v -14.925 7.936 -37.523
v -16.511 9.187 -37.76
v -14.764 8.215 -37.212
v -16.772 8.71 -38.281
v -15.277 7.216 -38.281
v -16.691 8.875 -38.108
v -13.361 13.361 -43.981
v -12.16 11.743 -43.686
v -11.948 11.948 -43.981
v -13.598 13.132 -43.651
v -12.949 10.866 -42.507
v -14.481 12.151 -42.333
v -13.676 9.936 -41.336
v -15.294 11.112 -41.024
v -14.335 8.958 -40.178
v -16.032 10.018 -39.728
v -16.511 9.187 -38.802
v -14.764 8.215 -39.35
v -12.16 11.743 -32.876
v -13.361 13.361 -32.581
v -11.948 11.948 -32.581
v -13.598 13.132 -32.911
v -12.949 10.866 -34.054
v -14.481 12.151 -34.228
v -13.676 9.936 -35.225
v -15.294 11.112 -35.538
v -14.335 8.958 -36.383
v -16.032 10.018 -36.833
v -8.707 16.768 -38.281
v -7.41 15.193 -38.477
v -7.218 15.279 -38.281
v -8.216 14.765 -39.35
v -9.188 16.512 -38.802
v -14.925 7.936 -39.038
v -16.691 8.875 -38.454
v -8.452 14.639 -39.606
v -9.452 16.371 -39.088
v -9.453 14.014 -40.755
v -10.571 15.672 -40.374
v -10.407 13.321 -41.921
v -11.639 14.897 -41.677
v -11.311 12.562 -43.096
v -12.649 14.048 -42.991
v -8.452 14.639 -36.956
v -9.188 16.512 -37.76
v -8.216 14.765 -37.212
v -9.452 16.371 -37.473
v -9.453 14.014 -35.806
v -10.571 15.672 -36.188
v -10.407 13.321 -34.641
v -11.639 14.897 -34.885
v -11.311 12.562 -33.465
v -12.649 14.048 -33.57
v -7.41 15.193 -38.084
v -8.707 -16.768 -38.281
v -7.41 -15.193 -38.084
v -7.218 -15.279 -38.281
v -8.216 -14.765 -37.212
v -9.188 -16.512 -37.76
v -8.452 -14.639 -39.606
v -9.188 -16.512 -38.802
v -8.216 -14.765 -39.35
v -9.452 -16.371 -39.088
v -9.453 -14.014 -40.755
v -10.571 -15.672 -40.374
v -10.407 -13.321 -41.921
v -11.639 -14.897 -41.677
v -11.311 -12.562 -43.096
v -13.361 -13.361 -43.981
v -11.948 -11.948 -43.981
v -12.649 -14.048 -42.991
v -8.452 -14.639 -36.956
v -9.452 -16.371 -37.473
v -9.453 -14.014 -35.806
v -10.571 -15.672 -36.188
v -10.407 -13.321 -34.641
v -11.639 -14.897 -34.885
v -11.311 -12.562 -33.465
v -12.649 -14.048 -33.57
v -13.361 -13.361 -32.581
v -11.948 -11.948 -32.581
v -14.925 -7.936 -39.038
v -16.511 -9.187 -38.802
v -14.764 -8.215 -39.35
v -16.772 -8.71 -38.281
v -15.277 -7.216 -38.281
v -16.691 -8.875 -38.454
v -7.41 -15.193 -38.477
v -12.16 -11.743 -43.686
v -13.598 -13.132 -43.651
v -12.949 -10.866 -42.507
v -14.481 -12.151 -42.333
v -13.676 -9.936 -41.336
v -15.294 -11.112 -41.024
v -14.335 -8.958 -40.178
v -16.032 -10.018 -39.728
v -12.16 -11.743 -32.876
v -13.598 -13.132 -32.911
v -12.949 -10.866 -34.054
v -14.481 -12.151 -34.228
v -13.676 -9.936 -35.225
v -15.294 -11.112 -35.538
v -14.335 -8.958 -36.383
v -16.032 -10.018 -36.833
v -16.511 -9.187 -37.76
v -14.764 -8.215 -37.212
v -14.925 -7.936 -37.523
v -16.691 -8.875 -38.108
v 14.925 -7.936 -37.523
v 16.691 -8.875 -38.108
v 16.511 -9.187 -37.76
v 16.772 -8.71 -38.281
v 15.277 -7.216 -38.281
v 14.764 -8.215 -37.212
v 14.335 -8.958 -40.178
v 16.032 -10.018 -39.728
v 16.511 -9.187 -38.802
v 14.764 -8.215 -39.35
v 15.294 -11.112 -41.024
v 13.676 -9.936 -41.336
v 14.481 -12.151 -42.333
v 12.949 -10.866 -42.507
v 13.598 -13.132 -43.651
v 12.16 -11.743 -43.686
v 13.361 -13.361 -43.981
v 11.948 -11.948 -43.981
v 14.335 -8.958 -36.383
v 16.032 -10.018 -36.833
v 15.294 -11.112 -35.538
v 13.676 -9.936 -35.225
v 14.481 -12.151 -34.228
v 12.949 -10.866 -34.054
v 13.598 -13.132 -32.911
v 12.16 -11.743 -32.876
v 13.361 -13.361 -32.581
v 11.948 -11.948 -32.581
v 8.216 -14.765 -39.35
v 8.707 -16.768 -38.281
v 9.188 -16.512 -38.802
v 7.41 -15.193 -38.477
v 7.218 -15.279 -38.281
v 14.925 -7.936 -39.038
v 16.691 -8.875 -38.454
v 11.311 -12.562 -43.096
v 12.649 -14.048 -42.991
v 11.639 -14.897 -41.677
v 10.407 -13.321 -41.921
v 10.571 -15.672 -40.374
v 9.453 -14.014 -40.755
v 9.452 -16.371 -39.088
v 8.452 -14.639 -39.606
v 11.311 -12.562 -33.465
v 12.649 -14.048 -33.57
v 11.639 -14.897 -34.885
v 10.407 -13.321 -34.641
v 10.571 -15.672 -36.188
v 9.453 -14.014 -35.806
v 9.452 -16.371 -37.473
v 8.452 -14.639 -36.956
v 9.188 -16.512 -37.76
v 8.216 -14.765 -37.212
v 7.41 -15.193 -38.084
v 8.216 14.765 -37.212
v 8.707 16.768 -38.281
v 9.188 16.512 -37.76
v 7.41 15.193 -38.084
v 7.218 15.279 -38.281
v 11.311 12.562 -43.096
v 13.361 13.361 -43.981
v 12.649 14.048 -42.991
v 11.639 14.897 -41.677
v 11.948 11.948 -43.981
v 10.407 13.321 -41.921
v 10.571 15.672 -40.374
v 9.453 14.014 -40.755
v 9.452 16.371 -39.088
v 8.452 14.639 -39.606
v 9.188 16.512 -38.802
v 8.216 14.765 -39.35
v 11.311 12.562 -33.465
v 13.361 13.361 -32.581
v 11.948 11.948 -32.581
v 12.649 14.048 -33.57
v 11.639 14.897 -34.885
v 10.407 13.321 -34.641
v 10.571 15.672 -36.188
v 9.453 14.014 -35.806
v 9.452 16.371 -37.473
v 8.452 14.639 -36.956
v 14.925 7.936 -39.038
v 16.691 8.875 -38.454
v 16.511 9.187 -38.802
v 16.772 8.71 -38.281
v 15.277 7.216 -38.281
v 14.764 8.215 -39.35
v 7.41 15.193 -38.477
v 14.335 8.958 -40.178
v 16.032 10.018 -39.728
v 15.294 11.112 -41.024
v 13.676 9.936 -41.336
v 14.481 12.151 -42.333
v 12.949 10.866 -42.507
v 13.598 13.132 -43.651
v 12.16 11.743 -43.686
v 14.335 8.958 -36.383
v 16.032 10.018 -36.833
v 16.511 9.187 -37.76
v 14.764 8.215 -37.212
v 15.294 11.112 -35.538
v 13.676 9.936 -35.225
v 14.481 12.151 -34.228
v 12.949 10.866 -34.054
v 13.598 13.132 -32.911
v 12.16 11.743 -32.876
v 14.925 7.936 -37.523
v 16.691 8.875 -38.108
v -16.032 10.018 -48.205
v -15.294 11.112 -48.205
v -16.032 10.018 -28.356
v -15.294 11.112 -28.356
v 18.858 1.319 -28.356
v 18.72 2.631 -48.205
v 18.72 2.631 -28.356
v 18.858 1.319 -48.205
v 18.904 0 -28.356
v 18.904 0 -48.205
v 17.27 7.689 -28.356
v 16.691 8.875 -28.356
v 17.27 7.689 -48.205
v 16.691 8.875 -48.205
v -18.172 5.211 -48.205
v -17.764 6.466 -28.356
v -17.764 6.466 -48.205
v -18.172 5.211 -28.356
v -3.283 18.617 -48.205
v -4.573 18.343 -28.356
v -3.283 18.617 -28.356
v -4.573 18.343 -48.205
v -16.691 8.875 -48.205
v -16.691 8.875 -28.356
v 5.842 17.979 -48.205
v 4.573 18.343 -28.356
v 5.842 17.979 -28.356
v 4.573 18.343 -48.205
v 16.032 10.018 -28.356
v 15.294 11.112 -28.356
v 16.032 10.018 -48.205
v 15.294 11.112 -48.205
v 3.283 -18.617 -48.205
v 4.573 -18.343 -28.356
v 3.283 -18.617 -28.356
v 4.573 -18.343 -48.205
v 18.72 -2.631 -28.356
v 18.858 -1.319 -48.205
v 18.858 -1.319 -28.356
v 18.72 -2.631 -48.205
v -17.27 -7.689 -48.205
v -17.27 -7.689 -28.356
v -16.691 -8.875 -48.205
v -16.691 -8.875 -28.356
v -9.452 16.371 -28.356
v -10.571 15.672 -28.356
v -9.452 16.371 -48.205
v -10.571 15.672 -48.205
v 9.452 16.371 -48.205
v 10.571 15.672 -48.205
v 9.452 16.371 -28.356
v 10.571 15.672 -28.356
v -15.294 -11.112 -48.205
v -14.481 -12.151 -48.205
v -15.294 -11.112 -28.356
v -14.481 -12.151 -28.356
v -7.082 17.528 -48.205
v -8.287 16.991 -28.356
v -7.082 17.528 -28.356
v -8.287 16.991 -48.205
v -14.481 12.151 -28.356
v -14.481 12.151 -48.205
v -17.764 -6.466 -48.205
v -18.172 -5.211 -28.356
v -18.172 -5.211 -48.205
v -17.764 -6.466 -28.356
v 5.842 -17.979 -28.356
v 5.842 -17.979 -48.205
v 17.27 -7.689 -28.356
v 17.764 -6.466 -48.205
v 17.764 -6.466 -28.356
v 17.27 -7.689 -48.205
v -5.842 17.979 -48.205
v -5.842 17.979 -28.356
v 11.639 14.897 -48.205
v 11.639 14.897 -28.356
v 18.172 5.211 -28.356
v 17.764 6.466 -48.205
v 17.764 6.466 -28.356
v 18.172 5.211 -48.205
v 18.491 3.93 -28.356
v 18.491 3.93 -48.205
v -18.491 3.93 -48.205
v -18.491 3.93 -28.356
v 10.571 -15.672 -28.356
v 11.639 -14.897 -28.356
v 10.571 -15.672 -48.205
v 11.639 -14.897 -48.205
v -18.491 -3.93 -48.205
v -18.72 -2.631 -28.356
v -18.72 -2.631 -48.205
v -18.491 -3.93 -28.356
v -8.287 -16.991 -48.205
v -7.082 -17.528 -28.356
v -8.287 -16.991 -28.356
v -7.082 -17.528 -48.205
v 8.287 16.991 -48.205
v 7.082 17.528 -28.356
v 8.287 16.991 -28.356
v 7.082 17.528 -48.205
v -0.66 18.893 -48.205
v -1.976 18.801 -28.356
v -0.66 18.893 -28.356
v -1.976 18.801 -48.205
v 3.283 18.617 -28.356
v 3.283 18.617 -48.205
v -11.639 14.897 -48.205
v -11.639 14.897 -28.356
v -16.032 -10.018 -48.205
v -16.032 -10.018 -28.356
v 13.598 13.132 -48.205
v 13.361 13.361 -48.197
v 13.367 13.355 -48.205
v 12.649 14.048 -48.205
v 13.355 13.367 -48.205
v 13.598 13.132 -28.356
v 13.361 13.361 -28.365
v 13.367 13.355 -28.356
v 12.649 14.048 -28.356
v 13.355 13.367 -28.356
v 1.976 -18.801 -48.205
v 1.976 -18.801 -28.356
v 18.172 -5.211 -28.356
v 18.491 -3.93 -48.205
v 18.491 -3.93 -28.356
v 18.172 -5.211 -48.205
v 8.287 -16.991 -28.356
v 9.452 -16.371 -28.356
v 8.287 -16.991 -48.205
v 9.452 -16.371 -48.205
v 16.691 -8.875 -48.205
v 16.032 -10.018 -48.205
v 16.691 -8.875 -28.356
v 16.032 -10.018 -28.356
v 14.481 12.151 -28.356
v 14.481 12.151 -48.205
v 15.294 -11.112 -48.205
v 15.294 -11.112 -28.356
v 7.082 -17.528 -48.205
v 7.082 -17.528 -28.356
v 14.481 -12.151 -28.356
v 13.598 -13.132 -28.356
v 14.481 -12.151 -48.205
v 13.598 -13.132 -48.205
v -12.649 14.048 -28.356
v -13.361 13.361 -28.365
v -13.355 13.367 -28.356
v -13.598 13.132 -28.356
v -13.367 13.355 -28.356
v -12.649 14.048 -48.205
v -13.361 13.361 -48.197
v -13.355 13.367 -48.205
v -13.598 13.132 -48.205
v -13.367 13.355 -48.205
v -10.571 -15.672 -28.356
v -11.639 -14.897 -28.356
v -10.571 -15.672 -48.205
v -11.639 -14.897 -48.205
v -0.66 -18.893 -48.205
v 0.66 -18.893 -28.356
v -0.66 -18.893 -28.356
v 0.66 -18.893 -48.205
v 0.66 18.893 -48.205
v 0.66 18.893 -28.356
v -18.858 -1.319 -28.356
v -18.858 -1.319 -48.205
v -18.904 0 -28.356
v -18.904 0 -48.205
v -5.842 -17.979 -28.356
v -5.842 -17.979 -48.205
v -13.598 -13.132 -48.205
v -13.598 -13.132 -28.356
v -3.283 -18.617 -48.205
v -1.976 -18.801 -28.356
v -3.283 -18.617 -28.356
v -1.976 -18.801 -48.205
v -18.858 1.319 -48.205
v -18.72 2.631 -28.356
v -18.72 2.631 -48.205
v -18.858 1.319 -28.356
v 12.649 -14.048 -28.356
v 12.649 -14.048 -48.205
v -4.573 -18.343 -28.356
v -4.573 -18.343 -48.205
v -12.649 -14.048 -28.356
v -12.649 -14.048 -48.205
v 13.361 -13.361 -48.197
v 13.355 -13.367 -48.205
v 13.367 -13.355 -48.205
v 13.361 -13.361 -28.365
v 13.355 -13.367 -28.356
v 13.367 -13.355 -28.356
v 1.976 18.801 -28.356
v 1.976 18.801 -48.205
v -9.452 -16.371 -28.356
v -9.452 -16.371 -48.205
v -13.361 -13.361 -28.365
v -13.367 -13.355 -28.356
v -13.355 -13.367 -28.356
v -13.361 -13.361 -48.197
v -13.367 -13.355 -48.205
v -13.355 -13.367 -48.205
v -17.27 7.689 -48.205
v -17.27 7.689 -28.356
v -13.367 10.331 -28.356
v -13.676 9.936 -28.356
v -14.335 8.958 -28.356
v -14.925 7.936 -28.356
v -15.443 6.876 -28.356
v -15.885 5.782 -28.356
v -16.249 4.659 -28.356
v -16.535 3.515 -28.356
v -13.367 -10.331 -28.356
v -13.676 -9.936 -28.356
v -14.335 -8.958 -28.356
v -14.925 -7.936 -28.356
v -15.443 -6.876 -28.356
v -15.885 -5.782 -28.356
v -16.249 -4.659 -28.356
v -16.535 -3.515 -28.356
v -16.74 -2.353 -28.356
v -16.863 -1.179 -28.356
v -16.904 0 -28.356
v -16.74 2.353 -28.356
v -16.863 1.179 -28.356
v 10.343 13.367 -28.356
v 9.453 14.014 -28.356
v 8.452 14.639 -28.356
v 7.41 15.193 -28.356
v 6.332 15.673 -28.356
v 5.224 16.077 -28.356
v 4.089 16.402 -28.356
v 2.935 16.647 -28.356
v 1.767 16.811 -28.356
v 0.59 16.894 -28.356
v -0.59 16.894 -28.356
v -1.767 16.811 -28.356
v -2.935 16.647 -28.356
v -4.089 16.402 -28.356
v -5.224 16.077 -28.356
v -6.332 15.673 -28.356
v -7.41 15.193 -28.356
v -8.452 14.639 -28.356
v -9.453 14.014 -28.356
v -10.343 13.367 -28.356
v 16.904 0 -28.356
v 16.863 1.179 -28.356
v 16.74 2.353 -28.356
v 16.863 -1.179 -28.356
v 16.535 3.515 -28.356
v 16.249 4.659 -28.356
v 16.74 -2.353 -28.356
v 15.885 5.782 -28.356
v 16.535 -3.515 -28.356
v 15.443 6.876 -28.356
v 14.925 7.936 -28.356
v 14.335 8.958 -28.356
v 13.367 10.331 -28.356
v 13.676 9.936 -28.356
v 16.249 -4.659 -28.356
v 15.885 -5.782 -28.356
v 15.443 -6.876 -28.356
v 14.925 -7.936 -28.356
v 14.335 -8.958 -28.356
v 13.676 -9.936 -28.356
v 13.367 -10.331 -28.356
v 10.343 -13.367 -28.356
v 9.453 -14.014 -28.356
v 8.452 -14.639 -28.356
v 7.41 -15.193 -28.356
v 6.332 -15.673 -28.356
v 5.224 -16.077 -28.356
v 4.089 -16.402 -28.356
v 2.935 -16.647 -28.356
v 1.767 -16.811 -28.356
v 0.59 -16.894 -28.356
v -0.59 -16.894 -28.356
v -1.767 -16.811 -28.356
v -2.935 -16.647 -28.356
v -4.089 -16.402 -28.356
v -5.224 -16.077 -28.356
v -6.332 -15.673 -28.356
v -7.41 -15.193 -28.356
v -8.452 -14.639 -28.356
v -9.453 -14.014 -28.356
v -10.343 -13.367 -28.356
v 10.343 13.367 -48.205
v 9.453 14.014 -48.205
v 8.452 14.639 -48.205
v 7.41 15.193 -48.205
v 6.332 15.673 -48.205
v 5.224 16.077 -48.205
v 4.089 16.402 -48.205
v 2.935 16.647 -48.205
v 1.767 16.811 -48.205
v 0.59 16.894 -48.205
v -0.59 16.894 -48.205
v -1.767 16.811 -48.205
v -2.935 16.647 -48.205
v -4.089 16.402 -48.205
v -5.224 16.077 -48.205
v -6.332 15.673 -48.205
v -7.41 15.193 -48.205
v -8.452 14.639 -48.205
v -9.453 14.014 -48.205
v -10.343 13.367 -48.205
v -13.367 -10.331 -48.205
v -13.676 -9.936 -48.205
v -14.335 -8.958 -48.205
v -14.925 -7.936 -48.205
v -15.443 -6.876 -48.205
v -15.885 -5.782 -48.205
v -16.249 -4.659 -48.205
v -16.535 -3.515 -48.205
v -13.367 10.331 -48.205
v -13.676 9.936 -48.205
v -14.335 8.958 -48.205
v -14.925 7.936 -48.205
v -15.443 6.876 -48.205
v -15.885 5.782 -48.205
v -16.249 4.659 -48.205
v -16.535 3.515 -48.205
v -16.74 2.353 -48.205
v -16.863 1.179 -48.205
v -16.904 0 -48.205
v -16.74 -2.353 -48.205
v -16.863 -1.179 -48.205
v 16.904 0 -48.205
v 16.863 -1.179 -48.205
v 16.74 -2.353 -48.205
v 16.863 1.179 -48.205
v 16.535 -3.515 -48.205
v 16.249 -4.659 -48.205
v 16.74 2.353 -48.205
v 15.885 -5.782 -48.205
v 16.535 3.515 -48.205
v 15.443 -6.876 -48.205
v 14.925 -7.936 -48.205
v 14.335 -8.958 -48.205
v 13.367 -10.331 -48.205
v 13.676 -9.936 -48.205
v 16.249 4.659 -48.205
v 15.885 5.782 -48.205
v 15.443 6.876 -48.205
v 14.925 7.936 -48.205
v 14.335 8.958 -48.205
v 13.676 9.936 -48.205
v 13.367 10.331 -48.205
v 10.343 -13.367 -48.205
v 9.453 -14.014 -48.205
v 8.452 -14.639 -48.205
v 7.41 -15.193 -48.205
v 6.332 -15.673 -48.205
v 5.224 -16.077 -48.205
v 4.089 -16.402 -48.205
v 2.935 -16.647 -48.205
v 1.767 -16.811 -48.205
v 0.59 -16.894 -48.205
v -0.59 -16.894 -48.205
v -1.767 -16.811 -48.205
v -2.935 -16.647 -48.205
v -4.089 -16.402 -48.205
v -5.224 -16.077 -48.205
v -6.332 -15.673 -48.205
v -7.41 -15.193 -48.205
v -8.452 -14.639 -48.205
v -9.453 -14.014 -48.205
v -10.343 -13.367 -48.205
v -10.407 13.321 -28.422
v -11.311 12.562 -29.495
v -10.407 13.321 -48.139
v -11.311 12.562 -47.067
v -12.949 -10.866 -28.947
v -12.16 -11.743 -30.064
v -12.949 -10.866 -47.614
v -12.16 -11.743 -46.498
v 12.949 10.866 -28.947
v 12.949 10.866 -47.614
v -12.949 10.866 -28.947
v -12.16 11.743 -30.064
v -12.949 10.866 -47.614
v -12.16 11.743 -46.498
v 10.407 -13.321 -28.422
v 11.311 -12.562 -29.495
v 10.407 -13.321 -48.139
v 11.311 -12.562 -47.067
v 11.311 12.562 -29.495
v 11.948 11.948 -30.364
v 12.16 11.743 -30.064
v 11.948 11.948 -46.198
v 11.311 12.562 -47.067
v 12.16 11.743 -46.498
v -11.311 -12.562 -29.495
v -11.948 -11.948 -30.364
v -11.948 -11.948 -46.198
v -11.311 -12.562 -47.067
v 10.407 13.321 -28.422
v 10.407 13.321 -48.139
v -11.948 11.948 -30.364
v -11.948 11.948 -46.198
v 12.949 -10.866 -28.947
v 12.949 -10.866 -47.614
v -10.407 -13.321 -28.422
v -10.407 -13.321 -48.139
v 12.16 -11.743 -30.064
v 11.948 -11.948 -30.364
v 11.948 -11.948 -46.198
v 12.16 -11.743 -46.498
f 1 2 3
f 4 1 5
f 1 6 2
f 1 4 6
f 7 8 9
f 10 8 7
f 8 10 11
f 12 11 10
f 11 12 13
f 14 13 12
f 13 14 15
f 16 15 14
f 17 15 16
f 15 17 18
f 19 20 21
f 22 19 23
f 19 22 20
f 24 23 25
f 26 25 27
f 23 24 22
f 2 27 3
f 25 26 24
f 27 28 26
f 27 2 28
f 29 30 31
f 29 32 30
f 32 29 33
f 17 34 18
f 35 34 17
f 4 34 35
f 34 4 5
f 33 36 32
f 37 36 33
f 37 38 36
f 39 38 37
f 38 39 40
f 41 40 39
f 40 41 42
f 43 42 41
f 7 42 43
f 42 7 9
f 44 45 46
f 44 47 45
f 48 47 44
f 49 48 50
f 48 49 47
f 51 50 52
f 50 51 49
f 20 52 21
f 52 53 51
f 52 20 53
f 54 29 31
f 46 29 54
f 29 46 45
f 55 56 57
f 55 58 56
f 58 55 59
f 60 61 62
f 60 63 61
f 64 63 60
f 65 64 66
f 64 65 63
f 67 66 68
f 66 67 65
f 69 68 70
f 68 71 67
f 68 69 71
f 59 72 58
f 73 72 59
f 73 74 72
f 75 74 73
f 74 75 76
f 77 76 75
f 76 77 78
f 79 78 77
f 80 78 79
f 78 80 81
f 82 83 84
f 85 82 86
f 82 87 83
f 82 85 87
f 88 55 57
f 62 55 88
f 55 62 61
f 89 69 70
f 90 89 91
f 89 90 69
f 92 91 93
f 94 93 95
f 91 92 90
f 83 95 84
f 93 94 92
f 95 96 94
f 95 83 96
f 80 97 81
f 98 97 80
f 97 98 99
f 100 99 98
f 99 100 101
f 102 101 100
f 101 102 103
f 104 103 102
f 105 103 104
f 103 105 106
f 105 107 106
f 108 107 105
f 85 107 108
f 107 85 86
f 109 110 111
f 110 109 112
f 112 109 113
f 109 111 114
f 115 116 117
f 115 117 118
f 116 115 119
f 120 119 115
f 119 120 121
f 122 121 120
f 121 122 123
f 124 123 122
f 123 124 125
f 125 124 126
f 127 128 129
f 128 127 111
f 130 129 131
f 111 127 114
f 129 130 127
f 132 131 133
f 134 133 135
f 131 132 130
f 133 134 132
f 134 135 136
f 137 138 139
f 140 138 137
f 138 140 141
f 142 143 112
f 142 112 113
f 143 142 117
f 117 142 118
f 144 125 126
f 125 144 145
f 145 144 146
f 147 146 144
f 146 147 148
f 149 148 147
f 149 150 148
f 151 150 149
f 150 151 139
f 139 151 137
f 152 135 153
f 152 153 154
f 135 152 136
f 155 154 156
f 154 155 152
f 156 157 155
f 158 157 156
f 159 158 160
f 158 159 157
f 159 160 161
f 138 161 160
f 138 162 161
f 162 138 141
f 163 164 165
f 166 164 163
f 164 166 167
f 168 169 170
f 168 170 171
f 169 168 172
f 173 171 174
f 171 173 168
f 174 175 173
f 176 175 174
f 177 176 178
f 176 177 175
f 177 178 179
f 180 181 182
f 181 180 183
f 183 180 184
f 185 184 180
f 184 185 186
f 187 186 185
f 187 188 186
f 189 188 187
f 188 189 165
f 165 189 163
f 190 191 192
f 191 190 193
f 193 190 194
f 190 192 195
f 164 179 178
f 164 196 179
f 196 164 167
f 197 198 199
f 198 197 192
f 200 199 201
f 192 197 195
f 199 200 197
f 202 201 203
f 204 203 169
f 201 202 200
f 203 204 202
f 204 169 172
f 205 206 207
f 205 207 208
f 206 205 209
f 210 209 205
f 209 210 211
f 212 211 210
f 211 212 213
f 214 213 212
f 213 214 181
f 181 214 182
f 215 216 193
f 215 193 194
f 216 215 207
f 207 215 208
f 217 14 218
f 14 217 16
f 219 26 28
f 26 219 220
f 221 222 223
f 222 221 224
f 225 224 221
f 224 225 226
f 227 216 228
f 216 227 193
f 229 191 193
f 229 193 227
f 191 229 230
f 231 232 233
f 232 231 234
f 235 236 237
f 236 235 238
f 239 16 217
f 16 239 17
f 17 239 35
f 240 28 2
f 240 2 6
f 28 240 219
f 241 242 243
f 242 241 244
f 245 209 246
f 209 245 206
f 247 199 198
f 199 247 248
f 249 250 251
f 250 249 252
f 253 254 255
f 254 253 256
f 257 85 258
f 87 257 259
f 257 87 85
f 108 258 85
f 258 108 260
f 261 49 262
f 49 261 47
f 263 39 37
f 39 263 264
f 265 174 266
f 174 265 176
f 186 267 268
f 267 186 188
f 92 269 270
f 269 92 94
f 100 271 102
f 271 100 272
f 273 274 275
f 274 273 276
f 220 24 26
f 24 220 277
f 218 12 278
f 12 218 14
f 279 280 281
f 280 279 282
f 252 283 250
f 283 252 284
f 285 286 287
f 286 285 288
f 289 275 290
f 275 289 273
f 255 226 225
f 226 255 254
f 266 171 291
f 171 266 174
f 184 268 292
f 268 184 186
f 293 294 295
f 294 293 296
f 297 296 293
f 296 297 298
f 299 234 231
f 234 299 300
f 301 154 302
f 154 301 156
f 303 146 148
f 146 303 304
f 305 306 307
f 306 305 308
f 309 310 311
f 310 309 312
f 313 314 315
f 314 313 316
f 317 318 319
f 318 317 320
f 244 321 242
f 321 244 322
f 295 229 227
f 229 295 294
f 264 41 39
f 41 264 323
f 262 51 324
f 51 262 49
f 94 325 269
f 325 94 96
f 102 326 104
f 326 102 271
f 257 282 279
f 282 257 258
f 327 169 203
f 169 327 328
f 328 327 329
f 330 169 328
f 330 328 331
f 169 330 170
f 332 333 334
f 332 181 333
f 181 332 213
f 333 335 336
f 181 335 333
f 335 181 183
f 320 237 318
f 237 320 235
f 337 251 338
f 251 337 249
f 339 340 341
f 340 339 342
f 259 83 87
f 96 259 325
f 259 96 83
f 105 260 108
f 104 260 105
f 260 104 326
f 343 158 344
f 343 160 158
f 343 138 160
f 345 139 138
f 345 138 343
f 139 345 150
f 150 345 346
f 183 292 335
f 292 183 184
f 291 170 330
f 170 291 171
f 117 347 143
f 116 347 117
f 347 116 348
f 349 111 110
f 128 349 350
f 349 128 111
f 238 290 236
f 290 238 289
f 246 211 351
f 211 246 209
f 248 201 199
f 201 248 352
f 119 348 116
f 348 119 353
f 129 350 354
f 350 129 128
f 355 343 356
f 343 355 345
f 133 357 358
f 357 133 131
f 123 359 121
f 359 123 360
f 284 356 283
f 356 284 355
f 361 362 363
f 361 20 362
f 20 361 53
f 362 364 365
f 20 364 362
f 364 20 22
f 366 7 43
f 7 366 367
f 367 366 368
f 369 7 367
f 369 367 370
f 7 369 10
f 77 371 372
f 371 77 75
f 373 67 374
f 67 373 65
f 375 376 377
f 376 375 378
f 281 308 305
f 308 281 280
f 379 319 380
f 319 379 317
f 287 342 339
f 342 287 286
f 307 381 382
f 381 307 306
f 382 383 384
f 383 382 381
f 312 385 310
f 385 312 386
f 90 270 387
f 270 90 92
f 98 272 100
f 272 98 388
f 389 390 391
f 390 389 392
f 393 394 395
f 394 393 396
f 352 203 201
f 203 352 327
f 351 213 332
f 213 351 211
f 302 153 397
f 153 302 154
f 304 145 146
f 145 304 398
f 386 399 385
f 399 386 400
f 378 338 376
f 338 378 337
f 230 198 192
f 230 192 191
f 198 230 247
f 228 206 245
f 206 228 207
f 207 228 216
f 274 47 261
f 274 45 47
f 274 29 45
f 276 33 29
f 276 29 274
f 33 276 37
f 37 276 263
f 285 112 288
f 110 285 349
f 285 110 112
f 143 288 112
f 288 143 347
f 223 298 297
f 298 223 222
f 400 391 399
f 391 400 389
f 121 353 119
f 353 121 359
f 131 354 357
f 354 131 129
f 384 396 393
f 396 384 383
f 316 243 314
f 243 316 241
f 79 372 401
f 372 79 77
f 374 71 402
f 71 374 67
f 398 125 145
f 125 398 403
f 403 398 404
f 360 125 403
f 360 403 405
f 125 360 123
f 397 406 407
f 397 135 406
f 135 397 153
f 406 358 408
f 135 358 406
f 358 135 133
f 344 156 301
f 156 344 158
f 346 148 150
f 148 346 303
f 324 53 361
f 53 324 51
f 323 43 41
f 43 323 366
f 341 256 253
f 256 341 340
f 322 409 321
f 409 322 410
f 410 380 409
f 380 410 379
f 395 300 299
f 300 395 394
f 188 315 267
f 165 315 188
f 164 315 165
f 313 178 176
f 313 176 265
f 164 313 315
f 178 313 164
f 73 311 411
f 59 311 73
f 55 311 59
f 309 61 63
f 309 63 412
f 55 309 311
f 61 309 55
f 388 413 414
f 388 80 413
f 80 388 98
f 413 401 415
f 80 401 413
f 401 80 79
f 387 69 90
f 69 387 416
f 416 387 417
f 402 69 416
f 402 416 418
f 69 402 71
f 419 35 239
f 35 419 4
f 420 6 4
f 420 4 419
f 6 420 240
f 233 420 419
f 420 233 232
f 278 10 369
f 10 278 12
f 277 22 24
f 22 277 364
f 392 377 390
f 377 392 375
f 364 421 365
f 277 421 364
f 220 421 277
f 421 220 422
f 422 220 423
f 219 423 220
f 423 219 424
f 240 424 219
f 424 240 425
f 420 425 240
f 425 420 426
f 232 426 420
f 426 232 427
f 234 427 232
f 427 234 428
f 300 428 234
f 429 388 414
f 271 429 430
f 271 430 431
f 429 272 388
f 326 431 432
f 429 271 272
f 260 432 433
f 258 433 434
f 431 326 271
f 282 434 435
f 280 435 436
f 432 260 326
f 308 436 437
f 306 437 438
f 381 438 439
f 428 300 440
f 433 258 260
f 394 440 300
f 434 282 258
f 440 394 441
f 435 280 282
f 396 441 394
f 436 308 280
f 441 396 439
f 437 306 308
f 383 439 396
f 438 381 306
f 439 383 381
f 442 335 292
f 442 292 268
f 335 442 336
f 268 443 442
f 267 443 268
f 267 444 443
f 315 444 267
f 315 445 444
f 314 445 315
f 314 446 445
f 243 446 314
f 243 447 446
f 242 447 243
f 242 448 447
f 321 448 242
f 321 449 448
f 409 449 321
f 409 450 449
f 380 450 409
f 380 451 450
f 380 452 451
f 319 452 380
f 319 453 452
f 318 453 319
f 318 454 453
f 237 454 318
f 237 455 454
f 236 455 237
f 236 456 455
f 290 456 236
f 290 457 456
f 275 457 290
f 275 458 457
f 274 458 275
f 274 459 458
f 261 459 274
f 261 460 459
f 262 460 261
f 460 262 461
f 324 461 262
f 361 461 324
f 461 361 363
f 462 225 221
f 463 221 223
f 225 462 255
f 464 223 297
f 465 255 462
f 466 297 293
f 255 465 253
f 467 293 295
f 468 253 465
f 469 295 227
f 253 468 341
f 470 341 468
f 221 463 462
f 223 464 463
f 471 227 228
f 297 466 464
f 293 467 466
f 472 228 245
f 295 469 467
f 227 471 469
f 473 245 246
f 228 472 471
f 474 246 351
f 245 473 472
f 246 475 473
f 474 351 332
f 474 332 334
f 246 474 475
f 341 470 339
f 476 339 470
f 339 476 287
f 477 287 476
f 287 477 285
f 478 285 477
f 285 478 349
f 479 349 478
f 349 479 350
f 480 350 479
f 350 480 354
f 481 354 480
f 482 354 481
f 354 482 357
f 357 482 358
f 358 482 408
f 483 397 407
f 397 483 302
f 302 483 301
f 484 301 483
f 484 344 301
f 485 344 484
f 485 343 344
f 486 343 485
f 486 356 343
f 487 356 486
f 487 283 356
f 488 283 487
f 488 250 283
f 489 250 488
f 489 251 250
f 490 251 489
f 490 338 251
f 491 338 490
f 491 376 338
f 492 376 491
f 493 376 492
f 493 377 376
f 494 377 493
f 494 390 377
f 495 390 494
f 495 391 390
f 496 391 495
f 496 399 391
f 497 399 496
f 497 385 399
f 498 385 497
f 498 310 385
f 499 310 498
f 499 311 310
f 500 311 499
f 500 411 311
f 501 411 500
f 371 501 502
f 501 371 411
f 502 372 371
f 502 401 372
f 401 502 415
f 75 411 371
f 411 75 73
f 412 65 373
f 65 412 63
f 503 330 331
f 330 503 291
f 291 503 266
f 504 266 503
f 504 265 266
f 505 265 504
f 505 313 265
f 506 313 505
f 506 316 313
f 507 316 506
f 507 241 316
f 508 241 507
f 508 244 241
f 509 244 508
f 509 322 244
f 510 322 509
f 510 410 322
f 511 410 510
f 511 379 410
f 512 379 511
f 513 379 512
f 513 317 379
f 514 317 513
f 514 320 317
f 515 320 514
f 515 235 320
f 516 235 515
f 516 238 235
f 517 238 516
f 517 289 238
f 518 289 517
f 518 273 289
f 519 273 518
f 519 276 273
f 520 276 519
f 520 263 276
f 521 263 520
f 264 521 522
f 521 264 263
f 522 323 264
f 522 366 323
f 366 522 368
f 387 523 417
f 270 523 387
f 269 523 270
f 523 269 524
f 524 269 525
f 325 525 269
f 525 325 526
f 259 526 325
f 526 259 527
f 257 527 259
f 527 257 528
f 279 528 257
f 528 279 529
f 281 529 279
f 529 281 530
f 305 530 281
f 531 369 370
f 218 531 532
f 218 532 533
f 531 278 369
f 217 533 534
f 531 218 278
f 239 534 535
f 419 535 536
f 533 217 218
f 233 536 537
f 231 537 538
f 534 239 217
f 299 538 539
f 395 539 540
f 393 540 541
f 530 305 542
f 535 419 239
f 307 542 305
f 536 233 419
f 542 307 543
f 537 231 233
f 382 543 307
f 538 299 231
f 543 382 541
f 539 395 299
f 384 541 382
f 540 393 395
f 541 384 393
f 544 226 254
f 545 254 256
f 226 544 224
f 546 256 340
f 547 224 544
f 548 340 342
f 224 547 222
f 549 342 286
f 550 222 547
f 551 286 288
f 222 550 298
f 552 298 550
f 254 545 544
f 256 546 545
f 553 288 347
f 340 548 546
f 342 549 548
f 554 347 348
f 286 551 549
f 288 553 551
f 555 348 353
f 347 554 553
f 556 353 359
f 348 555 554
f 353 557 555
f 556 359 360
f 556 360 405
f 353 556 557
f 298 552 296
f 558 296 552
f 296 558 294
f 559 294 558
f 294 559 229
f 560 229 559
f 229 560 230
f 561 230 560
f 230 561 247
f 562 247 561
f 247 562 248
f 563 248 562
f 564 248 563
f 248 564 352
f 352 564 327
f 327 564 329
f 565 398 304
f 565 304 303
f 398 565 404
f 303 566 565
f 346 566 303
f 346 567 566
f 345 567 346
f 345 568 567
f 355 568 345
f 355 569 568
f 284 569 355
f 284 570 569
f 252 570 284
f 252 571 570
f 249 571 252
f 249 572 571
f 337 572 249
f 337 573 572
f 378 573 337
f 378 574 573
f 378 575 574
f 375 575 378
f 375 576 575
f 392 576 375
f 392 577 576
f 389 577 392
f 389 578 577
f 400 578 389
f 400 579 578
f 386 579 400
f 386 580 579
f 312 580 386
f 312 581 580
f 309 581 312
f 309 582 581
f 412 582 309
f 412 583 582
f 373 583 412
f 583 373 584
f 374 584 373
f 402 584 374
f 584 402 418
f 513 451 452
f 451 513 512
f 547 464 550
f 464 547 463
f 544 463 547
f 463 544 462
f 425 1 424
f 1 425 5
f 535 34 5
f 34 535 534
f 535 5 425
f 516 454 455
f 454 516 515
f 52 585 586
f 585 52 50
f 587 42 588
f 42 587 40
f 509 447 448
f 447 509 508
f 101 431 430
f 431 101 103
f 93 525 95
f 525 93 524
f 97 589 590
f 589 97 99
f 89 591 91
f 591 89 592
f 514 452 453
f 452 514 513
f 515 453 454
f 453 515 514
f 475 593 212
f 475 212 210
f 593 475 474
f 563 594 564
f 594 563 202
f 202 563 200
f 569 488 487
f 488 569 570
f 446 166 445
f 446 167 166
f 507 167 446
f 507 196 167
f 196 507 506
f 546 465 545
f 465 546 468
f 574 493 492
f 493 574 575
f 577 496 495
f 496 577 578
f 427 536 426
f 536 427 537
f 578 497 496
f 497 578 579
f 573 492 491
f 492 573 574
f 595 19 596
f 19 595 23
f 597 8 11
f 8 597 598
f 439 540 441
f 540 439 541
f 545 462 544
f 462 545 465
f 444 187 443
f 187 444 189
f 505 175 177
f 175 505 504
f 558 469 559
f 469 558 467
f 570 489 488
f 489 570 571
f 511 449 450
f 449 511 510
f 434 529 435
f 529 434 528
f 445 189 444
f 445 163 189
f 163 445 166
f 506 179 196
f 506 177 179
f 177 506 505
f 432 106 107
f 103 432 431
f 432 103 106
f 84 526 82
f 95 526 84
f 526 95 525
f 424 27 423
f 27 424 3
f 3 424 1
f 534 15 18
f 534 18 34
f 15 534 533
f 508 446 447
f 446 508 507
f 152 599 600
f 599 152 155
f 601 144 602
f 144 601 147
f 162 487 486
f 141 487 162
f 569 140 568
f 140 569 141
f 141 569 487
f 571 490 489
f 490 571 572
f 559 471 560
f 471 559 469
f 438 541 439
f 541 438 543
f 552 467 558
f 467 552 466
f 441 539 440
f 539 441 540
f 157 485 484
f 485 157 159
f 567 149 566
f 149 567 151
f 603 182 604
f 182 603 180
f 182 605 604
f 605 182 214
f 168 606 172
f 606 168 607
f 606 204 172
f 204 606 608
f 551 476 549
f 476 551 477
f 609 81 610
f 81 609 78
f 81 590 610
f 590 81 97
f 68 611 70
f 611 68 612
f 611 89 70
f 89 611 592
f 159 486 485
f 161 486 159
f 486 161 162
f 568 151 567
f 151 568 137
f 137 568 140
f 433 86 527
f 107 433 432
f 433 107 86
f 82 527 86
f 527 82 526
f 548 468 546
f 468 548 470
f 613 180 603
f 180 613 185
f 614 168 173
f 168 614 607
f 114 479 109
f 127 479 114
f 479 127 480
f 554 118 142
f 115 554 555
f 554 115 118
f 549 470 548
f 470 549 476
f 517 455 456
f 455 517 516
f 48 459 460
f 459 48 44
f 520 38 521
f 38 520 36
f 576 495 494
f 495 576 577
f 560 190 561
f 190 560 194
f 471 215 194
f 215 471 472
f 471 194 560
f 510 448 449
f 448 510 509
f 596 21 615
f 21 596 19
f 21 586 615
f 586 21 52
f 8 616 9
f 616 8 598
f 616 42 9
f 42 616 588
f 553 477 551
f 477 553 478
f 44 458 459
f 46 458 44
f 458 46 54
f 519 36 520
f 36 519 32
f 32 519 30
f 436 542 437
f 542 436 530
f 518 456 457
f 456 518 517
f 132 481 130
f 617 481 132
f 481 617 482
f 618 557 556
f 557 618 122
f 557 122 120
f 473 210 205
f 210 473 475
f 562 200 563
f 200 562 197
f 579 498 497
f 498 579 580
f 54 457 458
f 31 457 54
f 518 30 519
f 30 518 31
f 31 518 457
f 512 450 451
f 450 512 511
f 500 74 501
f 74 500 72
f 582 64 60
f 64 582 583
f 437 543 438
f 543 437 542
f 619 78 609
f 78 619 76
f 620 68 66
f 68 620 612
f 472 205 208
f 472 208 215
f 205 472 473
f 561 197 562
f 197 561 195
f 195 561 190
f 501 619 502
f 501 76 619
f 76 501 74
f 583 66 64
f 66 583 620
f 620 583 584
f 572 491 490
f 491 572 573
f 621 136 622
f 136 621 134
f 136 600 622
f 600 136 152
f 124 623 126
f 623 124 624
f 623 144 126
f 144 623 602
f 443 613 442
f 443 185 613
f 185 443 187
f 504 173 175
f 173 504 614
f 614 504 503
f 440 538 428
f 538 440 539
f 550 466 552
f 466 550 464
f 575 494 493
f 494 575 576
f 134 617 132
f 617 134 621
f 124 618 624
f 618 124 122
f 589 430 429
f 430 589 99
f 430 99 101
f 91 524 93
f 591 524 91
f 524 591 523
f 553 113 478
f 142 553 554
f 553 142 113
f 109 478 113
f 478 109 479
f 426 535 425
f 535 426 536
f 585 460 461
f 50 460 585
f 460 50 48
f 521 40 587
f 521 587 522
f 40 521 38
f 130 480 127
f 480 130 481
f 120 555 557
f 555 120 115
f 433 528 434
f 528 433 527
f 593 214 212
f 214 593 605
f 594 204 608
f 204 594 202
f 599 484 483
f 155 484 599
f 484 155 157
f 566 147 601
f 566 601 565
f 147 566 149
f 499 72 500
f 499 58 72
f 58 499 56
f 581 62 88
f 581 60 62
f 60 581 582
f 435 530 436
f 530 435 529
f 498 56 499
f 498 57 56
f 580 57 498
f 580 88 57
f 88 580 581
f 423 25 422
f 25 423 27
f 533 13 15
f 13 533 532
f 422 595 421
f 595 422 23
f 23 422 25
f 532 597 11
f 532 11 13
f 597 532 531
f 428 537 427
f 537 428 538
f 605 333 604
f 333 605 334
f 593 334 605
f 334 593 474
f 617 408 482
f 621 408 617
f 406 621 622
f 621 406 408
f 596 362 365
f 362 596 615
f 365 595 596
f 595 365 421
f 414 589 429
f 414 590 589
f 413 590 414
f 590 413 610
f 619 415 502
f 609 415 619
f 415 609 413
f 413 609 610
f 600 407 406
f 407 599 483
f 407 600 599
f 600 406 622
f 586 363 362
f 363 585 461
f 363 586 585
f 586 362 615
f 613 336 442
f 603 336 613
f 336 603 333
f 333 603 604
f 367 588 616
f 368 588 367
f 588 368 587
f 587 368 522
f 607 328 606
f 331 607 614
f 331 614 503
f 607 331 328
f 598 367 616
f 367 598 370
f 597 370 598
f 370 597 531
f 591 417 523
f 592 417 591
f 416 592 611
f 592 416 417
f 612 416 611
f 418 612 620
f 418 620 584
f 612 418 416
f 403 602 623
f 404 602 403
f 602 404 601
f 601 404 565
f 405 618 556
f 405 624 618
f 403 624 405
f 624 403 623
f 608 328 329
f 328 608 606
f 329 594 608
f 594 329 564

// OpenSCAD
arete = 66.836;
paroi = 1.5;
echelleReductionAjustementBouchon = 0.985;
r = 0.19; // résolution d'impression sur l'axe Z
octa_sch = [3,4];
Cpi = 3.14159;
Cphi = (1+sqrt(5))/2;
Cepsilon = 0.00000001;

function octa_ext_radius(a) =
    a/2*(sqrt(2));

function octa_int_radius(a) =
    a/6*sqrt(6);

function octa_arete_from(radius) =
    radius*6/sqrt(6);

circumRadius = octa_ext_radius(arete);
internalRadius = octa_ext_radius(
                    octa_arete_from(
                        octa_int_radius(arete)-paroi));

echo(circumRadius=circumRadius);
echo(internalRadius=internalRadius);
echo(dihedral=plat_dihedral(octa_sch));

//octahedron(arete);
//octa_creux();
//decoupe_bouchon();
// corps_ouvert();
// bouchon();
//trou();
support();

module rotate_on_vertex() {
    rotate([0,plat_dihedral(octa_sch)/2,0]) children();
}

module support() {
    $fn=90;
    difference() {
        translate([0,0,-circumRadius*0.81])
            cylinder(circumRadius*0.42, r=circumRadius*0.4, center=true);
        translate([0,0,-circumRadius*0.9])
            cylinder(circumRadius, r=circumRadius*0.4-2, center=true);

        rotate_on_vertex() #octahedron(circumRadius);
        translate([0,0,-2*circumRadius*0.81])
            rotate_on_vertex() octahedron(circumRadius);

        // holes
        for (i=[1:4]) {
            rotate([0, 270, i*360/4+45]) translate([-circumRadius*0.81,0,-10])
                cylinder(h=20, r=5.7, center=true, $fn=4);
        }
    }
}

module corps_ouvert() {
	difference() {
		octa_creux();
		decoupe_bouchon();
	}
}

module bouchon() {
//    rotate([180, 0, 0])
	scale([echelleReductionAjustementBouchon, echelleReductionAjustementBouchon, 0.995])
	difference () {
        intersection() {
            octa_creux();
            decoupe_bouchon(echelleReductionAjustementBouchon);
        }
	}
}

module octa_creux() {
	difference() {
        octahedron(circumRadius);
        octahedron(internalRadius);
	}
}

module decoupe_bouchon(scale=1) {
    distance = octa_int_radius(arete);
	rotate([0,0,60]) translate([0,0, distance])
		cylinder(paroi, r=arete*0.56, $fn=3, center=true);
	rotate([0,0,60]) translate([0,0, distance-paroi])
		cylinder(paroi, r=(arete-paroi)*0.551, $fn=3, center=true);
}


module octahedron(rad) {
    // create an instance of a spherical coordinate
    // long - rotation around z -axis
    // lat - latitude, starting at 0 == 'north pole'
    // rad - distance from center
    function sph(long, lat, rad=1) = [long, lat, rad];

    // Convert spherical to cartesian
    function sph_to_cart(s) = [
	clean(s[2]*sin(s[1])*cos(s[0])),

	clean(s[2]*sin(s[1])*sin(s[0])),

	clean(s[2]*cos(s[1]))
	];

    function sphu_from_cart(c, rad=1) = sph(
        atan2(c[1],c[0]),
        atan2(sqrt(c[0]*c[0]+c[1]*c[1]), c[2]),
        rad
        );

    octa_cart = [
        [+1, 0, 0],  // + x axis
        [-1, 0, 0],	// - x axis
        [0, +1, 0],	// + y axis
        [0, -1, 0],	// - y axis
        [0, 0, +1],	// + z axis
        [0, 0, -1] 	// - z axis
    ];

    function octa_unit(rad=1) = [
        sph_to_cart(sphu_from_cart(octa_cart[0], rad)),
        sph_to_cart(sphu_from_cart(octa_cart[1], rad)),
        sph_to_cart(sphu_from_cart(octa_cart[2], rad)),
        sph_to_cart(sphu_from_cart(octa_cart[3], rad)),
        sph_to_cart(sphu_from_cart(octa_cart[4], rad)),
        sph_to_cart(sphu_from_cart(octa_cart[5], rad)),
        ];

    octafaces = [
        [4,2,0],
        [4,0,3],
        [4,3,1],
        [4,1,2],
        [5,0,2],
        [5,3,0],
        [5,1,3],
        [5,2,1]
        ];

    octa_edges = [
        [0,2],
        [0,3],
        [0,4],
        [0,5],
        [1,2],
        [1,3],
        [1,4],
        [1,5],
        [2,4],
        [2,5],
        [3,4],
        [3,5],
        ];

    function octahedron(rad=1) = [octa_unit(rad), octafaces, octa_edges];

    rotate([0, 90-plat_dihedral(octa_sch)/2, 0])
    rotate([45, 0, 0])
    polyhedron(octa_unit(rad), faces=octafaces);
}
//translate([0, 0, -17.7])
//cylinder(5,40,40);

function clean(n) = (n < 0) ? ((n < -Cepsilon) ? n : 0) :
	(n < Cepsilon) ? 0 : n;

function plat_dihedral(pq) = 2 * asin( cos(180/pq[1])/sin(180/pq[0]));

function plat_circumradius(pq, a) =
	(a/2)*
	tan(Cpi/pq[1])*
	tan(plat_dihedral(pq)/2);

function plat_midradius(pq, a) =
	(a/2)*
	cos(Cpi/pq[0])*
	tan(plat_dihedral(pq)/2);

function plat_inradius(pq,a) =
	a/(2*tan(Cpi/pq[0]))*
	sqrt((1-cos(plat_dihedral(pq)))/(1+cos(plat_dihedral(pq))));

function plat_a_from_inradius(pq, inradius) =
    inradius*(2*tan(Cpi/pq[0]))/
	sqrt((1-cos(plat_dihedral(pq)))/(1+cos(plat_dihedral(pq))));
